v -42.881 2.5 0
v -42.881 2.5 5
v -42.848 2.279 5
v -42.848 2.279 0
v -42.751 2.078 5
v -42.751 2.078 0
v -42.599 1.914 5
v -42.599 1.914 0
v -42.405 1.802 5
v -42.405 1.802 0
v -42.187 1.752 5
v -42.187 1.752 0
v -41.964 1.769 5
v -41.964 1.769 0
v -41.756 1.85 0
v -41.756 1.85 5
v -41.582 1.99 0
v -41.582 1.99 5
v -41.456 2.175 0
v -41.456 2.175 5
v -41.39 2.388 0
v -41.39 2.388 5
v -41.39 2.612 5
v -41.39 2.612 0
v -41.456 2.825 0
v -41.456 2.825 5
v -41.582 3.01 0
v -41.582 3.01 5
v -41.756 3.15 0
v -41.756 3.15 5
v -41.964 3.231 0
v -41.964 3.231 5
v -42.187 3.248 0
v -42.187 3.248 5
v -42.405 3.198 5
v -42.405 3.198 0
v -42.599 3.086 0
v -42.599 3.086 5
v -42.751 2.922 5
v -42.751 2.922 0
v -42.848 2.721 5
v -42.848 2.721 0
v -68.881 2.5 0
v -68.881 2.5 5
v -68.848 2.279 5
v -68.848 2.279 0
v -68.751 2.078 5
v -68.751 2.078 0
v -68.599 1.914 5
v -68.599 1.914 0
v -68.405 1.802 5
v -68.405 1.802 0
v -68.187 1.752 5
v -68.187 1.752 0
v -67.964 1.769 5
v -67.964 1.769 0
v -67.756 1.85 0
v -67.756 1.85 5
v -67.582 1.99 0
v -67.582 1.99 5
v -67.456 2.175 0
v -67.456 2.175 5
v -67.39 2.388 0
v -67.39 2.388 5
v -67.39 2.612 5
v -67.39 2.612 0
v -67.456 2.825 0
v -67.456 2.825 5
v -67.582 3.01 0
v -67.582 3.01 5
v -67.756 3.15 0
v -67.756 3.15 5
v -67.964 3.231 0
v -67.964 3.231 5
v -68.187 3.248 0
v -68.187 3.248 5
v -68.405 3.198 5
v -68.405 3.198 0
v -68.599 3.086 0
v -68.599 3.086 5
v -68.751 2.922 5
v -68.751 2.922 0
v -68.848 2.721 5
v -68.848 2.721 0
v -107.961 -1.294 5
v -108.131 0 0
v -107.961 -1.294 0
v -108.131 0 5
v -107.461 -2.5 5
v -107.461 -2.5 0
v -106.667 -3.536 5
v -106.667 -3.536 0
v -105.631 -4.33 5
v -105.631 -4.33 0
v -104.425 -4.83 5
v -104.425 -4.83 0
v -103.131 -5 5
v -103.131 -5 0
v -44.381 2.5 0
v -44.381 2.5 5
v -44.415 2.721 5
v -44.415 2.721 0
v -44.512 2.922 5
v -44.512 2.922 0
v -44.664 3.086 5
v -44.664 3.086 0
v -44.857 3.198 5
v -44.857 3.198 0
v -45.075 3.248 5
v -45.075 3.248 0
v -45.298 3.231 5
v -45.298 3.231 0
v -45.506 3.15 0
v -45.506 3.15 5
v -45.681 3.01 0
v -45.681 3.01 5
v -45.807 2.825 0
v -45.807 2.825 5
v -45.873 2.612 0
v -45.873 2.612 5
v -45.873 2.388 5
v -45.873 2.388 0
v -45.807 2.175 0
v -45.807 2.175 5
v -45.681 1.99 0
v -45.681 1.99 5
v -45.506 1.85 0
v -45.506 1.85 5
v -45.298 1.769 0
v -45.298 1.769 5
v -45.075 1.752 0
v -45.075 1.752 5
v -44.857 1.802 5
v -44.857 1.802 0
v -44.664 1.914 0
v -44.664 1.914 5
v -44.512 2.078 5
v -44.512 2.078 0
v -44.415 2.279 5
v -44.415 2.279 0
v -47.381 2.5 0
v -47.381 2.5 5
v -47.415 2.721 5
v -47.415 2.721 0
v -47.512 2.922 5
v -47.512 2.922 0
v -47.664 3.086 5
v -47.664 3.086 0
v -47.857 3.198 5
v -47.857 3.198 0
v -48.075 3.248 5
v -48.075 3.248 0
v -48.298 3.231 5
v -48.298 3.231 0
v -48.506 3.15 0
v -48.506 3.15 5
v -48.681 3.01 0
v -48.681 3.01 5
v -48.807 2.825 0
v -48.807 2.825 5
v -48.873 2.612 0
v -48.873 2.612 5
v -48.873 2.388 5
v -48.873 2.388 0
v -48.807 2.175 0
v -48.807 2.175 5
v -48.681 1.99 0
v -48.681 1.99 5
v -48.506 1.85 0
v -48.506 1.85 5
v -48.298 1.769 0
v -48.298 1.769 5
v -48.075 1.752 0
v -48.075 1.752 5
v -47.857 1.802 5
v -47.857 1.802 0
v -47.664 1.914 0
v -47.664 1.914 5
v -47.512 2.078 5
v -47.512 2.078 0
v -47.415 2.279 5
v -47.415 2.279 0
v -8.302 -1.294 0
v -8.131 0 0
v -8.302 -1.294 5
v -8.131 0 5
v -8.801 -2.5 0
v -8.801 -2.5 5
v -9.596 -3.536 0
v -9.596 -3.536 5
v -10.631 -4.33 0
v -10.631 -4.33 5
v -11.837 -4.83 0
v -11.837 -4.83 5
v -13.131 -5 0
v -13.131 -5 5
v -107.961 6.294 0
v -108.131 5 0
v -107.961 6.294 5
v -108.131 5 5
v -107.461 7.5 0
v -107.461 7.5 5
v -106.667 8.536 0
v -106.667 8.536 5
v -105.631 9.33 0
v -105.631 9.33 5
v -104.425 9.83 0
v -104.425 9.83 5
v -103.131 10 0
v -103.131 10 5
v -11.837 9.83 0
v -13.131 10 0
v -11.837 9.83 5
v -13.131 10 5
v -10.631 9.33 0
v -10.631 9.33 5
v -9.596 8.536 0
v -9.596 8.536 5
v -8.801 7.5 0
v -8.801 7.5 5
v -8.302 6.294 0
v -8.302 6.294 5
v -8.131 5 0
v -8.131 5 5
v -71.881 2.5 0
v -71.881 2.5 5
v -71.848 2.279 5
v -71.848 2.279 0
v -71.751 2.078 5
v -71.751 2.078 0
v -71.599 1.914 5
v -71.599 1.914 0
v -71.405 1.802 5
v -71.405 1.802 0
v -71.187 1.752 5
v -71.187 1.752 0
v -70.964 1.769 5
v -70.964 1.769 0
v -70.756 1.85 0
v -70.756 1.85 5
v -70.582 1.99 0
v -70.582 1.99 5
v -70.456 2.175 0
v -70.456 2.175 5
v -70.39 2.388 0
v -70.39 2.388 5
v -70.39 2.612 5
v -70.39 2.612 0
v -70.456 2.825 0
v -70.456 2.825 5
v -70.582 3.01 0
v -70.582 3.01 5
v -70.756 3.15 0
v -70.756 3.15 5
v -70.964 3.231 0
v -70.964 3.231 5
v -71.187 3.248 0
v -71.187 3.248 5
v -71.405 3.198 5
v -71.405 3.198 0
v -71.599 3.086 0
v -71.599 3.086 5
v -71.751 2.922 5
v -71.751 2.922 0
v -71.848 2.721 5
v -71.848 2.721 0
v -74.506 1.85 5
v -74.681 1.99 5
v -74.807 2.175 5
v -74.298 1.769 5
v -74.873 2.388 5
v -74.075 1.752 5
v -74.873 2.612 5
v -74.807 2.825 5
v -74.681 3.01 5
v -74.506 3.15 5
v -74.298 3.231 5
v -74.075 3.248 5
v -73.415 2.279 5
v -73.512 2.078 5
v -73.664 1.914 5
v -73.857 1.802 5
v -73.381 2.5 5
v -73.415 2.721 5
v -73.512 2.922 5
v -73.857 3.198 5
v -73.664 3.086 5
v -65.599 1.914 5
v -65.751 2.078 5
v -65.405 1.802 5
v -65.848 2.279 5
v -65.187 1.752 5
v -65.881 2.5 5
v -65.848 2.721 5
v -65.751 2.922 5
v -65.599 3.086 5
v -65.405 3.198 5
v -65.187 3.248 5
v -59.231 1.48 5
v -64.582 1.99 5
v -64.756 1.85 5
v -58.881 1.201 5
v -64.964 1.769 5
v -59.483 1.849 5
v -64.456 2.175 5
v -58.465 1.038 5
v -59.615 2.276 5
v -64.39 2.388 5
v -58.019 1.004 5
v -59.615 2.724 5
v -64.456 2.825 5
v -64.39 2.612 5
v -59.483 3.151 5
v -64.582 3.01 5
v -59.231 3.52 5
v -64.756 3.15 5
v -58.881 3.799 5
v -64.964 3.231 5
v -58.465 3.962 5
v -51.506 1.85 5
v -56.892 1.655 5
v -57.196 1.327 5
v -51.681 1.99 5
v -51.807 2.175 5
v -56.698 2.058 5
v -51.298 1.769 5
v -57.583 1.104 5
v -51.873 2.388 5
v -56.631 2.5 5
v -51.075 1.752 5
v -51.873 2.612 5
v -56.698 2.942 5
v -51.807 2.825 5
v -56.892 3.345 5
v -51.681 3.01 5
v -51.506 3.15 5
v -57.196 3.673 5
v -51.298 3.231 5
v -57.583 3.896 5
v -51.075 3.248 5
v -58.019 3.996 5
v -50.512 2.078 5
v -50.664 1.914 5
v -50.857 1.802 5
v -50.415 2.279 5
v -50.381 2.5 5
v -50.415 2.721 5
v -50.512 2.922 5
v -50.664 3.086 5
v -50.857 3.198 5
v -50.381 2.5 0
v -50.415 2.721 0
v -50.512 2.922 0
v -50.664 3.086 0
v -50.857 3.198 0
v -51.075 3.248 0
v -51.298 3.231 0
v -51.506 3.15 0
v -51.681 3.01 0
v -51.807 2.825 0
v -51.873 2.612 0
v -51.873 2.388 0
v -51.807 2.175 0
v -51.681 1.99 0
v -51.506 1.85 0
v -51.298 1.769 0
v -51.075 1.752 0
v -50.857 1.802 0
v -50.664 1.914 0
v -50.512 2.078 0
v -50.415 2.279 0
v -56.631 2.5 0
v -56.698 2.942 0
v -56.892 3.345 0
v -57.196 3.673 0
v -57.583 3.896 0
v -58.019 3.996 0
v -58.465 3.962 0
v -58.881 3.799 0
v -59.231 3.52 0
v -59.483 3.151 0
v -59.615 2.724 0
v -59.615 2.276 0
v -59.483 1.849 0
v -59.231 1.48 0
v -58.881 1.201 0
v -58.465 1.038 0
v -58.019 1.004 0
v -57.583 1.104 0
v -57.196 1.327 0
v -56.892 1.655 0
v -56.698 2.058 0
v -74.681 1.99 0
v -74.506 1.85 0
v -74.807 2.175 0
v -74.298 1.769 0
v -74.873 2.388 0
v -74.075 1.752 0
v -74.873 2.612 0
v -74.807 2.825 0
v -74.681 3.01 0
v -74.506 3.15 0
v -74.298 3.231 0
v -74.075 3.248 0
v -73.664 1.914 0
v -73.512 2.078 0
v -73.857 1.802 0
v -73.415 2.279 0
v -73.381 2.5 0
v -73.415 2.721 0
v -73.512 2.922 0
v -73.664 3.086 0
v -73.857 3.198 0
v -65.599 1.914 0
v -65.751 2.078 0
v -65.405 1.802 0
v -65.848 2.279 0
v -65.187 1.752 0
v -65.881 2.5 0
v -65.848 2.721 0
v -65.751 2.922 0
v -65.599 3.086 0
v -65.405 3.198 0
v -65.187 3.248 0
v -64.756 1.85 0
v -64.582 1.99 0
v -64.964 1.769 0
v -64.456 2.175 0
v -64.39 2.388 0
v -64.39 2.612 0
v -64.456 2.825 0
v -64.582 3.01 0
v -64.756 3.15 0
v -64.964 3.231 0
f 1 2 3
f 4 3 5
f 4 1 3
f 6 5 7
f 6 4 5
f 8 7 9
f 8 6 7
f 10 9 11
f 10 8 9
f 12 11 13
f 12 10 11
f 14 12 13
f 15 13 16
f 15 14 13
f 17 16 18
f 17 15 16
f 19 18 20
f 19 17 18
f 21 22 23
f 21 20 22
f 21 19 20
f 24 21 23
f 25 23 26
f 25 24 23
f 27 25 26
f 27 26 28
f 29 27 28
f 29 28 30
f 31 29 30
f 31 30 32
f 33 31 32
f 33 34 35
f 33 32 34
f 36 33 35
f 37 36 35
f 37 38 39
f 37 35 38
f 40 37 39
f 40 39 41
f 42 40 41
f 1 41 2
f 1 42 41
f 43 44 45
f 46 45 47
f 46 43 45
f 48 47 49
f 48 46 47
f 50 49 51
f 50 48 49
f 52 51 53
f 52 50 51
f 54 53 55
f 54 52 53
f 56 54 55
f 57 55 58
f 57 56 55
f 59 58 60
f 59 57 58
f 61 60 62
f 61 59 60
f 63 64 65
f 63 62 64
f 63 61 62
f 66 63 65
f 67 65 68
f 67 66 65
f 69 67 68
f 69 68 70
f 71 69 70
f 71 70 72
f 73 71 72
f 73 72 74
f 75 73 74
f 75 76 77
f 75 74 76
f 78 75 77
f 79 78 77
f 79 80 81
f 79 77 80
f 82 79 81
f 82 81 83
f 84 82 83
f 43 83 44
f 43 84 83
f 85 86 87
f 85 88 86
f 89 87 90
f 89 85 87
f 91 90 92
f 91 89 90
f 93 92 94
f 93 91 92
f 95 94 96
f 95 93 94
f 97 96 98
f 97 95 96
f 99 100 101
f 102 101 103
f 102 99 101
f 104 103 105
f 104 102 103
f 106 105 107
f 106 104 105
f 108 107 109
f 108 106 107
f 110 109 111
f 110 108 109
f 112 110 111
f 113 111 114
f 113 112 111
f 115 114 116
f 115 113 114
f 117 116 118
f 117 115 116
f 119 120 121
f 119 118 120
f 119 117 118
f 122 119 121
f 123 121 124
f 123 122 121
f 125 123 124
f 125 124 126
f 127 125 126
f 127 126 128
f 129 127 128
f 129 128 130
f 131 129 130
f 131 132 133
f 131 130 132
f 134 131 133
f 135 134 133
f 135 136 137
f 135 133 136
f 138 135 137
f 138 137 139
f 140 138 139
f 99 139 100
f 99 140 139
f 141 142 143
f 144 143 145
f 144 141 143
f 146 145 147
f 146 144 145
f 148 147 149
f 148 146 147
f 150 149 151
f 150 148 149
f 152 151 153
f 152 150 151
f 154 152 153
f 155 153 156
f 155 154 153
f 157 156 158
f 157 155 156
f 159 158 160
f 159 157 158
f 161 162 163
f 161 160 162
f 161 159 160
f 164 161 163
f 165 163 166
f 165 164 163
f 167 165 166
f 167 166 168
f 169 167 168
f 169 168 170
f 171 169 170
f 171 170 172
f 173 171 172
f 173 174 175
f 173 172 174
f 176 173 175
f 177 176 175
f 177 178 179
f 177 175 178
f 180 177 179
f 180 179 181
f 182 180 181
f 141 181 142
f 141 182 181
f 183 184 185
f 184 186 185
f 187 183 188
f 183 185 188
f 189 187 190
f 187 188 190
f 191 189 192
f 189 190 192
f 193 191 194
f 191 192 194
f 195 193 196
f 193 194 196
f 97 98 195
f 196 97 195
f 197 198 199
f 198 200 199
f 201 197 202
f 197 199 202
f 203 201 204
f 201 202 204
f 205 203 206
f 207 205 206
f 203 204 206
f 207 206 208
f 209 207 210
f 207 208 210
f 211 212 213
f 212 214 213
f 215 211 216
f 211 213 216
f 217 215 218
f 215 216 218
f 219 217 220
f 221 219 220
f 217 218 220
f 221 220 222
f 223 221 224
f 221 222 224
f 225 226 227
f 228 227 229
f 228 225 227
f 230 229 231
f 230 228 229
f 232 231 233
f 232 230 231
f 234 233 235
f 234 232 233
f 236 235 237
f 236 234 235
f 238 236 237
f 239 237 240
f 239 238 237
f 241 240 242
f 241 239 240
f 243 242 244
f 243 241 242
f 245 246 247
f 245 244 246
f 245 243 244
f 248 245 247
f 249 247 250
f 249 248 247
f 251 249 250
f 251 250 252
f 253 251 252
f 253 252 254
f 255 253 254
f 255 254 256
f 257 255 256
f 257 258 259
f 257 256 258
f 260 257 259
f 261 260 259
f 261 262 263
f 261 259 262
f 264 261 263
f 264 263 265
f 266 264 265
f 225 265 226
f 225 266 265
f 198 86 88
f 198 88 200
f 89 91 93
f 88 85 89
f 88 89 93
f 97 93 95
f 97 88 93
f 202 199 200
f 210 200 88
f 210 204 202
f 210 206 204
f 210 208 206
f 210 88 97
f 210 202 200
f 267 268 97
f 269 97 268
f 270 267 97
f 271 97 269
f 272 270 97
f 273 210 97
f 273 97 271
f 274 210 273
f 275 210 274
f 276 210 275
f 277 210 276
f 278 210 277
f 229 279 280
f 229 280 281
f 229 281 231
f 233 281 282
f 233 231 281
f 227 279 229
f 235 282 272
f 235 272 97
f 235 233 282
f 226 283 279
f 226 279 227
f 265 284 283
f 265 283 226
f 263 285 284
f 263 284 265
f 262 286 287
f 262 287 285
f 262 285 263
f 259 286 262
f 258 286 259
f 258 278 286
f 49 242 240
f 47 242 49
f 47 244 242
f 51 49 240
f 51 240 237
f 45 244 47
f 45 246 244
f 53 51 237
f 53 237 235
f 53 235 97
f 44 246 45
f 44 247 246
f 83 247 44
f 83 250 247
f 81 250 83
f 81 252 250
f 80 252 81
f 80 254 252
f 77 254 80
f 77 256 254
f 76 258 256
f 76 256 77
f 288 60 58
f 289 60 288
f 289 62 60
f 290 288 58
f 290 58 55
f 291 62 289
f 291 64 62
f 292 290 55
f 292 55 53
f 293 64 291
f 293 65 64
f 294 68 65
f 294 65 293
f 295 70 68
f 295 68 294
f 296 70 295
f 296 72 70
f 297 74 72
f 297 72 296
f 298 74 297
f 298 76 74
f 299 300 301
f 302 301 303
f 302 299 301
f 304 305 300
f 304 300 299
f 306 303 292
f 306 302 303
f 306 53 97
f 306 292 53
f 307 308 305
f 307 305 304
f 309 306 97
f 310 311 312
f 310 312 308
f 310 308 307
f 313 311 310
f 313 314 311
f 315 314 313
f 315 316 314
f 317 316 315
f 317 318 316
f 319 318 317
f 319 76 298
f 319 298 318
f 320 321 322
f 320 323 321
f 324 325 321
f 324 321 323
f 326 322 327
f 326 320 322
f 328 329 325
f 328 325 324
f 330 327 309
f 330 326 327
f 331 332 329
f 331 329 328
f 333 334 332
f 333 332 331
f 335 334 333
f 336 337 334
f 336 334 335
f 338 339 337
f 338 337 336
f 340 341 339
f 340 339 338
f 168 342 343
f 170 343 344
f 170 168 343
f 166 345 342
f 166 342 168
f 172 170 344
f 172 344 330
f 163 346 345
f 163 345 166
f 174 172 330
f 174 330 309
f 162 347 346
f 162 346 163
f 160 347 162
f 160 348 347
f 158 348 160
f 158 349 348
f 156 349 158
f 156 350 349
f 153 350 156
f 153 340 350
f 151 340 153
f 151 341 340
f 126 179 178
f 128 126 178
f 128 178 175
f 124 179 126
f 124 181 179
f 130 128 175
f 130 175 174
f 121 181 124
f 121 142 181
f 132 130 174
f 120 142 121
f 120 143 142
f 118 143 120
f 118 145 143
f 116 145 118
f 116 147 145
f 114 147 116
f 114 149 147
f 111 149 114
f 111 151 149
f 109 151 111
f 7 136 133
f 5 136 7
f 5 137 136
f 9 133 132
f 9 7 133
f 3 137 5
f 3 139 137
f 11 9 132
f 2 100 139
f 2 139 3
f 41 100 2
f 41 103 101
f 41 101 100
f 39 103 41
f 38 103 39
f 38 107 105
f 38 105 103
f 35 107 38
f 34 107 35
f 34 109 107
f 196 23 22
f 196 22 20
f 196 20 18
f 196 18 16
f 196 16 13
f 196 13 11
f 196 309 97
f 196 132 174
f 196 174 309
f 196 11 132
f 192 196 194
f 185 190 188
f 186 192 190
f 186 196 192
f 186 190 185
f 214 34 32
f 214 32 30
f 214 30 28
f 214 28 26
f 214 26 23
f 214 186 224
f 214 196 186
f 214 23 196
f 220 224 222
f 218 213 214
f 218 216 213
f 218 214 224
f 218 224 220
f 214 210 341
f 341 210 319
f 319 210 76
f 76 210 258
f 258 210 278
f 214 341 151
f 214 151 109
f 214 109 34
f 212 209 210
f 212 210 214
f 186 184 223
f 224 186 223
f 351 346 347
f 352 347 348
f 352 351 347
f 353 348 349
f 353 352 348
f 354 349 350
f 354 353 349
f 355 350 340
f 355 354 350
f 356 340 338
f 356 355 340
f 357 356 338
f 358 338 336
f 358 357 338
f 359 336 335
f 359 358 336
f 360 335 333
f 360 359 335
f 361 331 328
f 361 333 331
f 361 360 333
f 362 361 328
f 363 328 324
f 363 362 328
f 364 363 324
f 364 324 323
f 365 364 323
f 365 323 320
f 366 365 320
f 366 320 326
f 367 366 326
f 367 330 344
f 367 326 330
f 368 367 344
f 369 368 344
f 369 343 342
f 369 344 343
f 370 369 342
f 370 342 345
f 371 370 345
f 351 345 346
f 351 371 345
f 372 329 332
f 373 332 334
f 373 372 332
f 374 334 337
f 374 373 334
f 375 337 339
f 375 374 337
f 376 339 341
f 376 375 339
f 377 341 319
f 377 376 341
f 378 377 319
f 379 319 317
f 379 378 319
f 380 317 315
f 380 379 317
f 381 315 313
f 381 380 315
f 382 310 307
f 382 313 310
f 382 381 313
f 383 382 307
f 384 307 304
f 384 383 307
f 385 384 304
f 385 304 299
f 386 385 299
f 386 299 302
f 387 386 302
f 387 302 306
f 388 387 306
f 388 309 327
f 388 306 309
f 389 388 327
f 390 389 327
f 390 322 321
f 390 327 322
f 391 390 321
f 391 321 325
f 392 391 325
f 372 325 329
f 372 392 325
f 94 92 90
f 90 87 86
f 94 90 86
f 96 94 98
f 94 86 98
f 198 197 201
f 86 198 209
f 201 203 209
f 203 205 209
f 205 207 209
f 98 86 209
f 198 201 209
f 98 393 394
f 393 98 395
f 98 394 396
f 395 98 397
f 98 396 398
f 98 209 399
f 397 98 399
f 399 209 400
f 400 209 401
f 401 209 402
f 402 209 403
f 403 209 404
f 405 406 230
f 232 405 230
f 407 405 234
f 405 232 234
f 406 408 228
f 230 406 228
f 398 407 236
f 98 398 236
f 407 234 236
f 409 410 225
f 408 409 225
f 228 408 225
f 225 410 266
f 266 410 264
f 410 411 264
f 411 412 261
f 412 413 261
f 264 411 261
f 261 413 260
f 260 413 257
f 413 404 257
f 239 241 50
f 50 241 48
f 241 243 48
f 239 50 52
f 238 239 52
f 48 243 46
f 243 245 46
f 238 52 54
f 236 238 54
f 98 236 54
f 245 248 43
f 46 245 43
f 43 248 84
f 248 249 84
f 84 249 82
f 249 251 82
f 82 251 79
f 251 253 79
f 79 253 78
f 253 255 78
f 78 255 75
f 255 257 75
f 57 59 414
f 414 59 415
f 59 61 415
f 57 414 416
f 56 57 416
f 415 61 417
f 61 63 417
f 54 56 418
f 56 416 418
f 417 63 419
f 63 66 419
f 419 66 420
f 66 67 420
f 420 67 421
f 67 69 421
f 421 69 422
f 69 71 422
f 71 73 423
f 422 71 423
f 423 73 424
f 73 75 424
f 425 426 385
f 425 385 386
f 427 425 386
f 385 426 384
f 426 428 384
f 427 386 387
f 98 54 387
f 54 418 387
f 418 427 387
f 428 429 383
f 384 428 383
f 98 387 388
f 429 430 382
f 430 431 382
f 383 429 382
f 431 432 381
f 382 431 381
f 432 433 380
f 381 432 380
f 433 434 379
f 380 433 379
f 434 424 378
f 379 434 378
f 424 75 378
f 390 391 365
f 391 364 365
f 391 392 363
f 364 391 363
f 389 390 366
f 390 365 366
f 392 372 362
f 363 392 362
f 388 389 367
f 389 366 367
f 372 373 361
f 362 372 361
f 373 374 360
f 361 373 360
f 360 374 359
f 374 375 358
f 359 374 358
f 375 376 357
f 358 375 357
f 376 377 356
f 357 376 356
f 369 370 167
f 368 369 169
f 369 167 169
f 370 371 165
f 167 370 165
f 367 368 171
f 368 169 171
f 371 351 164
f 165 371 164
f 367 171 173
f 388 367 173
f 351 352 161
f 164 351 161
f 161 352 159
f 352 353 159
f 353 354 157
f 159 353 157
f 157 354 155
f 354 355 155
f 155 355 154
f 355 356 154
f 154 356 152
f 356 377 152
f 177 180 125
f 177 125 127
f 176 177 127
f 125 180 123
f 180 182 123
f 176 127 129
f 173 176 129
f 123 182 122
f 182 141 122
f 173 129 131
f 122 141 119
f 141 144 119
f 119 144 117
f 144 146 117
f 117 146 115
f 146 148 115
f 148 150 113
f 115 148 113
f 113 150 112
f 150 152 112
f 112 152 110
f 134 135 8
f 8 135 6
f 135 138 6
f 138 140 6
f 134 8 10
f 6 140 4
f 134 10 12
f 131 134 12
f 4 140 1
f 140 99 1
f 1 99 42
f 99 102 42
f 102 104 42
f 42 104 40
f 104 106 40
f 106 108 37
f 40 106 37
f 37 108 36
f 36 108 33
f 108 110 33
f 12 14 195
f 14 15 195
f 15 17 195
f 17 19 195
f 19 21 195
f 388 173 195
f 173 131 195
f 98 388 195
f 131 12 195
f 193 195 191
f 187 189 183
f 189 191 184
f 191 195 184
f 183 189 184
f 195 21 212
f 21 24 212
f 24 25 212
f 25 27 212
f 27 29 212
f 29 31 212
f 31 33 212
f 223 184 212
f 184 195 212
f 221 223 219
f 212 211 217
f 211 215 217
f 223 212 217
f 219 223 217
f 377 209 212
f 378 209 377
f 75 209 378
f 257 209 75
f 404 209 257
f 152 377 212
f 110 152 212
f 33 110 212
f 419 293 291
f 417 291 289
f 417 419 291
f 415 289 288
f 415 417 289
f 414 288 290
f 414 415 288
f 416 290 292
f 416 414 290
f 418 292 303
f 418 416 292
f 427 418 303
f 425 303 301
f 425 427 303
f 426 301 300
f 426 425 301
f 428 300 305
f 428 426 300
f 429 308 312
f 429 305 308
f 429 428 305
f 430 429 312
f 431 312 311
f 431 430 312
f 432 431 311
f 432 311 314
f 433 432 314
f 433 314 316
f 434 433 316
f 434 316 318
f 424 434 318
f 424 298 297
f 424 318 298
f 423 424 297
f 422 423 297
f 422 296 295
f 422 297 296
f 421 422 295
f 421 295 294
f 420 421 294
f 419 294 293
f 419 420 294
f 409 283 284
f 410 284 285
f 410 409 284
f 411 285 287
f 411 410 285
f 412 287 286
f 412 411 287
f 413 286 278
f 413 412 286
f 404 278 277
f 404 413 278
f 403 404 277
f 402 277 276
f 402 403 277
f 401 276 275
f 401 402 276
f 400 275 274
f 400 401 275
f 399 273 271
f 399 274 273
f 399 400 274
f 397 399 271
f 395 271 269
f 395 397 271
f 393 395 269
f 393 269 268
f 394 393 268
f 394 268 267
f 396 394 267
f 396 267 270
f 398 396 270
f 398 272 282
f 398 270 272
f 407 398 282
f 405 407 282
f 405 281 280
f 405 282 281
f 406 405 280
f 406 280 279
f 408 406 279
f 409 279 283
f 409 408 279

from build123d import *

# Parameters (mm, degrees)
SKETCH2_W           = 150
SKETCH2_H           = 15
BOSS_EXTRUDE1_DEPTH = 5
FILLET2_R           = 5
SKETCH6_R           = 1.5
SKETCH6_R_2         = 0.75
CUT_EXTRUDE4_DEPTH  = 134.599949611
SKETCH7_W           = 25
SKETCH7_H           = 15
SKETCH7_W_2         = 30.364729536
CUT_EXTRUDE6_DEPTH  = 45
FILLET3_R           = 5


with BuildPart() as part:
    # Sketch2 → Boss-Extrude1 (new body)
    with BuildSketch(Plane.XY):
        with Locations((-58.131313131, 2.5)):
            Rectangle(SKETCH2_W, SKETCH2_H)
    extrude(amount=BOSS_EXTRUDE1_DEPTH)

    # Fillet2
    fillet2_edges = [part.edges().sort_by_distance(p)[0] for p in [
        (-133.131313131, 10, 2.5),
        (16.868686869, 10, 2.5),
        (16.868686869, -5, 2.5),
        (-133.131313131, -5, 2.5),
    ]]
    fillet(fillet2_edges, radius=FILLET2_R)

    # Sketch6 → Cut-Extrude4 (cut, through all)
    with BuildSketch(Plane.XY):
        with Locations((-58.131313131, 2.5)):
            Circle(SKETCH6_R)
        with Locations((-51.131313131, 2.5)):
            Circle(SKETCH6_R_2)
        with Locations((-48.131313131, 2.5)):
            Circle(SKETCH6_R_2)
        with Locations((-45.131313131, 2.5)):
            Circle(SKETCH6_R_2)
        with Locations(Location((-65.131313131, 2.5, 0), (0, 0, 180))):
            Circle(SKETCH6_R_2)
        with Locations(Location((-68.131313131, 2.5, 0), (0, 0, 180))):
            Circle(SKETCH6_R_2)
        with Locations(Location((-71.131313131, 2.5, 0), (0, 0, 180))):
            Circle(SKETCH6_R_2)
        with Locations((-74.131313131, 2.5)):
            Circle(SKETCH6_R_2)
        with Locations(Location((-42.131313131, 2.5, 0), (0, 0, 180))):
            Circle(SKETCH6_R_2)
    extrude(amount=CUT_EXTRUDE4_DEPTH, mode=Mode.SUBTRACT)

    # Sketch7 → Cut-Extrude6 (cut)
    with BuildSketch(Plane.XY):
        with Locations((-120.631313131, 2.5)):
            Rectangle(SKETCH7_W, SKETCH7_H)
        with Locations((7.051051637, 2.5)):
            Rectangle(SKETCH7_W_2, SKETCH7_H)
    extrude(amount=CUT_EXTRUDE6_DEPTH, mode=Mode.SUBTRACT)

    # Fillet3
    fillet3_edges = [part.edges().sort_by_distance(p)[0] for p in [
        (-8.131313131, 10, 2.5),
        (-8.131313131, -5, 2.5),
        (-108.131313131, -5, 2.5),
        (-108.131313131, 10, 2.5),
    ]]
    fillet(fillet3_edges, radius=FILLET3_R)


solid = part.part
